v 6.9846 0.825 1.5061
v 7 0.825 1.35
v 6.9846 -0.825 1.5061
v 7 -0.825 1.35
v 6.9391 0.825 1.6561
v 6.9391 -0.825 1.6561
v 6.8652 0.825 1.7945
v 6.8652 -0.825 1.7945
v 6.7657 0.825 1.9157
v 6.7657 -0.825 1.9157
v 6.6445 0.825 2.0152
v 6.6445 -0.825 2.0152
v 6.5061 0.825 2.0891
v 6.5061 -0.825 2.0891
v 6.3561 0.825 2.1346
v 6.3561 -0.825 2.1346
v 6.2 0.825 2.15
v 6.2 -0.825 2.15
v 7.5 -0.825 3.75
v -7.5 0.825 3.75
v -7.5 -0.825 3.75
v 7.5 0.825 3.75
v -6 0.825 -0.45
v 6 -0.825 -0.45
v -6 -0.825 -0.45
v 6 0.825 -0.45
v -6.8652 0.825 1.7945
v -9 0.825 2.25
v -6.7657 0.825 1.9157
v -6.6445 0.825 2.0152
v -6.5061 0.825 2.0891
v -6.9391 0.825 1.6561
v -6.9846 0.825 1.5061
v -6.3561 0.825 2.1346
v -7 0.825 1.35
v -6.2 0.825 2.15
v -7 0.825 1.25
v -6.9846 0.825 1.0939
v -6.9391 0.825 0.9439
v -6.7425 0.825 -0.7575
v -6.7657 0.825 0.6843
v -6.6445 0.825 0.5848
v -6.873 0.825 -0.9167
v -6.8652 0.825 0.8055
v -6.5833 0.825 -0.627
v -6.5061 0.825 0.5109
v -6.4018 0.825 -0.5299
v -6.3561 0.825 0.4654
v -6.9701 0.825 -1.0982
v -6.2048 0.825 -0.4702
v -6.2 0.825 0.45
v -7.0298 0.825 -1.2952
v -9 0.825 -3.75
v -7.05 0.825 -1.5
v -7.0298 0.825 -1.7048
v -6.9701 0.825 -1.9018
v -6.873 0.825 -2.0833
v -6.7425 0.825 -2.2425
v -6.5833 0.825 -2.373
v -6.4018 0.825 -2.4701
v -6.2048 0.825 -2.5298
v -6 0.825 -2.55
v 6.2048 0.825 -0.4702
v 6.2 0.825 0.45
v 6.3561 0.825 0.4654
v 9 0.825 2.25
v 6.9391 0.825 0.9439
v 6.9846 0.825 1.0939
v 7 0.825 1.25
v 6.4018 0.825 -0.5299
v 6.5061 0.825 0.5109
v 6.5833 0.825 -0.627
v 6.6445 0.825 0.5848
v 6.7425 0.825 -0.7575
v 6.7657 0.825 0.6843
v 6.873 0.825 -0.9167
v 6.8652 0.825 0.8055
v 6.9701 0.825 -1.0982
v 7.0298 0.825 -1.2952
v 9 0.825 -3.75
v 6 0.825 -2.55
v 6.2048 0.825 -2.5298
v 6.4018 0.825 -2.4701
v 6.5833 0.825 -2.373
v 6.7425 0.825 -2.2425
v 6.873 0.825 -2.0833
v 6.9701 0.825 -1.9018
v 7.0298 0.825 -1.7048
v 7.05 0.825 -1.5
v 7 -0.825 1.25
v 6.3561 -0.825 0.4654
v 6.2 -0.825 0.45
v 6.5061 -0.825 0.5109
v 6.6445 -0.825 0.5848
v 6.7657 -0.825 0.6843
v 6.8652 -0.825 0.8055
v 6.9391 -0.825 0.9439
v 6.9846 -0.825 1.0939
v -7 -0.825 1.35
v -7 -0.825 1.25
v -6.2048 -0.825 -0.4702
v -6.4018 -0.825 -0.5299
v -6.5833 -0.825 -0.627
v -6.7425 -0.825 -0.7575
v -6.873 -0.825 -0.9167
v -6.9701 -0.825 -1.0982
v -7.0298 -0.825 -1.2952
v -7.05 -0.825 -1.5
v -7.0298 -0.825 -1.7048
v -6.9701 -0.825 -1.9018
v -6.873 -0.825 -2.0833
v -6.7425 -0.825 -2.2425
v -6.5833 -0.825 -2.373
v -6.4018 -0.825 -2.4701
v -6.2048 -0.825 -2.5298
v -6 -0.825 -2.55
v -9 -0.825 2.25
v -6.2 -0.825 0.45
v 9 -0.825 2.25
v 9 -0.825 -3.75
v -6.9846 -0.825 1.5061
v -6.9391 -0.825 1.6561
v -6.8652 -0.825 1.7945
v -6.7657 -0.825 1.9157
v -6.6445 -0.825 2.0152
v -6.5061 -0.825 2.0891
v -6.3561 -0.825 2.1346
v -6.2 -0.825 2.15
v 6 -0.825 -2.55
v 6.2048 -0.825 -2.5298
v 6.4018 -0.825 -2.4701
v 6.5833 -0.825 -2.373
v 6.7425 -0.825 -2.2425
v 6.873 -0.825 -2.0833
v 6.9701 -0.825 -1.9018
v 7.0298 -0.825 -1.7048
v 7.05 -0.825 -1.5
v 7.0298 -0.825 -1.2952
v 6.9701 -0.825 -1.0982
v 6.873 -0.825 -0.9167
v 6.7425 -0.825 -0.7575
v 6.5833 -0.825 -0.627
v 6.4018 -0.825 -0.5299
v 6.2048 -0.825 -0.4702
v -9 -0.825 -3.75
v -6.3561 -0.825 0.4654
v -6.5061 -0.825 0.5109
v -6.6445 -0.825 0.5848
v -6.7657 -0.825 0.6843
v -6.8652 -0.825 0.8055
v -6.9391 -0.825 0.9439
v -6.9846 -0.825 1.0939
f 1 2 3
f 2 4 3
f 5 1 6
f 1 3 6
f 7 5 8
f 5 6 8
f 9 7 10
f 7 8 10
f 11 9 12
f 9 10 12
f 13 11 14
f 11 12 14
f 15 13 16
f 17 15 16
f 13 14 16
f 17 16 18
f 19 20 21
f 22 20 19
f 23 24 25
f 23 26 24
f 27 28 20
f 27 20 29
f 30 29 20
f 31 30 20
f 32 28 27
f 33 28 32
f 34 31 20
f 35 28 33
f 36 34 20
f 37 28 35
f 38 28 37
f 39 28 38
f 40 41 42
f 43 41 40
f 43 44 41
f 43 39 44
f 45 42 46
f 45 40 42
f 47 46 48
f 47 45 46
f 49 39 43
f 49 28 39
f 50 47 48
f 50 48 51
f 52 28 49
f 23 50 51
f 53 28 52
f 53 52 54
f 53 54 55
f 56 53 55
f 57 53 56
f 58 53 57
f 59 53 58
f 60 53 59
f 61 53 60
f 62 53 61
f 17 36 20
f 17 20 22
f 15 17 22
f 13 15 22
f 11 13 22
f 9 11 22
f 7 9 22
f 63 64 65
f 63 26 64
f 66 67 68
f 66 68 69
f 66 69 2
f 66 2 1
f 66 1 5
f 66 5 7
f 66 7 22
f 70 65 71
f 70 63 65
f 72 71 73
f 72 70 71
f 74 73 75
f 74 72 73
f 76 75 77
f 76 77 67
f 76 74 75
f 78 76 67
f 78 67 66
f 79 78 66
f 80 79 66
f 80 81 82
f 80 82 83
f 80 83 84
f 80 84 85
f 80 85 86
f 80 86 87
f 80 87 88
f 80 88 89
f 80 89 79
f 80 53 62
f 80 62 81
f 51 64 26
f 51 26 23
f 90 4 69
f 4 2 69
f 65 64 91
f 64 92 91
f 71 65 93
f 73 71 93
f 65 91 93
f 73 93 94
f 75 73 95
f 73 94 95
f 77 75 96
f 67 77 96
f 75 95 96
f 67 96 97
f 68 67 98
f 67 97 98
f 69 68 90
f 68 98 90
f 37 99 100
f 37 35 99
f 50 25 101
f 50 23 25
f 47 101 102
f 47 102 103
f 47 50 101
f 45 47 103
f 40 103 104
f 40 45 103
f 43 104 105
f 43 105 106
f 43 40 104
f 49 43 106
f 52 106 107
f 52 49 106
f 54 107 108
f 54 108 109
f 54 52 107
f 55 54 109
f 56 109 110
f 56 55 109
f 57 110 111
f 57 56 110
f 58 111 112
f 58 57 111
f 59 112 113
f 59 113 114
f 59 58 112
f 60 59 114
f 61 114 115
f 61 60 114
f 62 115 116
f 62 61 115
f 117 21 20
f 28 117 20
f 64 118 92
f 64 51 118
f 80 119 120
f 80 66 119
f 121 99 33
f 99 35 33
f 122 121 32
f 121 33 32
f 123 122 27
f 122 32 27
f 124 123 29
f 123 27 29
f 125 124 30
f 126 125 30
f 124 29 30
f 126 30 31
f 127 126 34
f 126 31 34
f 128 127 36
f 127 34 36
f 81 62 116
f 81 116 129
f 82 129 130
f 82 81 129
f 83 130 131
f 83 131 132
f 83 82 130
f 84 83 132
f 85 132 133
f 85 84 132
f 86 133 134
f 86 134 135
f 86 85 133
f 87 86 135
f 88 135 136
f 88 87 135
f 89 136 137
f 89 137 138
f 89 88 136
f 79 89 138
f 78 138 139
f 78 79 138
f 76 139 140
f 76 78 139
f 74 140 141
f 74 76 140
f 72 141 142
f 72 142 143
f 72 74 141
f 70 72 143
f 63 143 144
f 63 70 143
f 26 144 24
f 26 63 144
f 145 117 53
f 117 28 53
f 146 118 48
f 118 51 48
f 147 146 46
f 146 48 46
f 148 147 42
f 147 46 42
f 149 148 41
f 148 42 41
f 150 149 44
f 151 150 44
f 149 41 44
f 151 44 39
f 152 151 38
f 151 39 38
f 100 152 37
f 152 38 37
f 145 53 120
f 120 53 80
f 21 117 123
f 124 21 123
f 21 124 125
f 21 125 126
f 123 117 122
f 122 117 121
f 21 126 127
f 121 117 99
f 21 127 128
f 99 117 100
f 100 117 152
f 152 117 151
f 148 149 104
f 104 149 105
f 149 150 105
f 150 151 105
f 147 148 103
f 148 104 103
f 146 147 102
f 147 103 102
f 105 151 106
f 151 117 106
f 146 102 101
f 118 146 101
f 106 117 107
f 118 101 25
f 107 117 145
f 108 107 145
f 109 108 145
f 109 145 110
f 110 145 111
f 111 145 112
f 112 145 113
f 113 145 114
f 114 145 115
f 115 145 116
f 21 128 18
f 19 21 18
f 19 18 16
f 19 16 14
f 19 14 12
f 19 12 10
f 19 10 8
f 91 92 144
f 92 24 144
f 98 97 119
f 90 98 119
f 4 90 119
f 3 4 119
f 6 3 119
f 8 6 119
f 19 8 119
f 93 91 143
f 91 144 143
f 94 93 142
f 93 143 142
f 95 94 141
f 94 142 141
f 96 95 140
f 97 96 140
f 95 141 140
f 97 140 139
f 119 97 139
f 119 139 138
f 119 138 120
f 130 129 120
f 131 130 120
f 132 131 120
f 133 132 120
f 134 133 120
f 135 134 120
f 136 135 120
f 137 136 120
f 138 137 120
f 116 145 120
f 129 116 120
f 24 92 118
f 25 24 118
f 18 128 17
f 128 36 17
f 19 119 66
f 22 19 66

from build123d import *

# Parameters (mm, degrees)
SKIZZE1_W                       = 18
SKIZZE1_H                       = 7.5
SKIZZE1_W_2                     = 14
SKIZZE1_H_2                     = 1.7
AUFSATZ_LINEAR_AUSTRAGEN1_DEPTH = 0.825
VERRUNDUNG1_R                   = 0.8
FASE1_SIZE                      = 1.5


with BuildPart() as part:
    # Skizze1 → Aufsatz-Linear austragen1 (new body, symmetric)
    with BuildSketch(Plane(origin=(0, 0, 0), x_dir=(1, 0, 0), z_dir=(0, 1, 0))):
        Rectangle(SKIZZE1_W, SKIZZE1_H)
        with Locations((0, -1.3)):
            Rectangle(SKIZZE1_W_2, SKIZZE1_H_2, mode=Mode.SUBTRACT)
        with BuildLine():
            Line((-6, 2.55), (6, 2.55))
            ThreePointArc((6, 2.55), (7.05, 1.5), (6, 0.45))
            Line((6, 0.45), (-6, 0.45))
            ThreePointArc((-6, 0.45), (-7.05, 1.5), (-6, 2.55))
        make_face(mode=Mode.SUBTRACT)
    extrude(amount=AUFSATZ_LINEAR_AUSTRAGEN1_DEPTH, both=True)

    # Verrundung1
    verrundung1_edges = [part.edges().sort_by_distance(p)[0] for p in [
        (-7, 0, 2.15),
        (-7, 0, 0.45),
        (7, 0, 0.45),
        (7, 0, 2.15),
    ]]
    fillet(verrundung1_edges, radius=VERRUNDUNG1_R)

    # Fase1
    fase1_edges = [part.edges().sort_by_distance(p)[0] for p in [
        (9, 0, 3.75),
        (-9, 0, 3.75),
    ]]
    chamfer(fase1_edges, length=FASE1_SIZE)


solid = part.part
